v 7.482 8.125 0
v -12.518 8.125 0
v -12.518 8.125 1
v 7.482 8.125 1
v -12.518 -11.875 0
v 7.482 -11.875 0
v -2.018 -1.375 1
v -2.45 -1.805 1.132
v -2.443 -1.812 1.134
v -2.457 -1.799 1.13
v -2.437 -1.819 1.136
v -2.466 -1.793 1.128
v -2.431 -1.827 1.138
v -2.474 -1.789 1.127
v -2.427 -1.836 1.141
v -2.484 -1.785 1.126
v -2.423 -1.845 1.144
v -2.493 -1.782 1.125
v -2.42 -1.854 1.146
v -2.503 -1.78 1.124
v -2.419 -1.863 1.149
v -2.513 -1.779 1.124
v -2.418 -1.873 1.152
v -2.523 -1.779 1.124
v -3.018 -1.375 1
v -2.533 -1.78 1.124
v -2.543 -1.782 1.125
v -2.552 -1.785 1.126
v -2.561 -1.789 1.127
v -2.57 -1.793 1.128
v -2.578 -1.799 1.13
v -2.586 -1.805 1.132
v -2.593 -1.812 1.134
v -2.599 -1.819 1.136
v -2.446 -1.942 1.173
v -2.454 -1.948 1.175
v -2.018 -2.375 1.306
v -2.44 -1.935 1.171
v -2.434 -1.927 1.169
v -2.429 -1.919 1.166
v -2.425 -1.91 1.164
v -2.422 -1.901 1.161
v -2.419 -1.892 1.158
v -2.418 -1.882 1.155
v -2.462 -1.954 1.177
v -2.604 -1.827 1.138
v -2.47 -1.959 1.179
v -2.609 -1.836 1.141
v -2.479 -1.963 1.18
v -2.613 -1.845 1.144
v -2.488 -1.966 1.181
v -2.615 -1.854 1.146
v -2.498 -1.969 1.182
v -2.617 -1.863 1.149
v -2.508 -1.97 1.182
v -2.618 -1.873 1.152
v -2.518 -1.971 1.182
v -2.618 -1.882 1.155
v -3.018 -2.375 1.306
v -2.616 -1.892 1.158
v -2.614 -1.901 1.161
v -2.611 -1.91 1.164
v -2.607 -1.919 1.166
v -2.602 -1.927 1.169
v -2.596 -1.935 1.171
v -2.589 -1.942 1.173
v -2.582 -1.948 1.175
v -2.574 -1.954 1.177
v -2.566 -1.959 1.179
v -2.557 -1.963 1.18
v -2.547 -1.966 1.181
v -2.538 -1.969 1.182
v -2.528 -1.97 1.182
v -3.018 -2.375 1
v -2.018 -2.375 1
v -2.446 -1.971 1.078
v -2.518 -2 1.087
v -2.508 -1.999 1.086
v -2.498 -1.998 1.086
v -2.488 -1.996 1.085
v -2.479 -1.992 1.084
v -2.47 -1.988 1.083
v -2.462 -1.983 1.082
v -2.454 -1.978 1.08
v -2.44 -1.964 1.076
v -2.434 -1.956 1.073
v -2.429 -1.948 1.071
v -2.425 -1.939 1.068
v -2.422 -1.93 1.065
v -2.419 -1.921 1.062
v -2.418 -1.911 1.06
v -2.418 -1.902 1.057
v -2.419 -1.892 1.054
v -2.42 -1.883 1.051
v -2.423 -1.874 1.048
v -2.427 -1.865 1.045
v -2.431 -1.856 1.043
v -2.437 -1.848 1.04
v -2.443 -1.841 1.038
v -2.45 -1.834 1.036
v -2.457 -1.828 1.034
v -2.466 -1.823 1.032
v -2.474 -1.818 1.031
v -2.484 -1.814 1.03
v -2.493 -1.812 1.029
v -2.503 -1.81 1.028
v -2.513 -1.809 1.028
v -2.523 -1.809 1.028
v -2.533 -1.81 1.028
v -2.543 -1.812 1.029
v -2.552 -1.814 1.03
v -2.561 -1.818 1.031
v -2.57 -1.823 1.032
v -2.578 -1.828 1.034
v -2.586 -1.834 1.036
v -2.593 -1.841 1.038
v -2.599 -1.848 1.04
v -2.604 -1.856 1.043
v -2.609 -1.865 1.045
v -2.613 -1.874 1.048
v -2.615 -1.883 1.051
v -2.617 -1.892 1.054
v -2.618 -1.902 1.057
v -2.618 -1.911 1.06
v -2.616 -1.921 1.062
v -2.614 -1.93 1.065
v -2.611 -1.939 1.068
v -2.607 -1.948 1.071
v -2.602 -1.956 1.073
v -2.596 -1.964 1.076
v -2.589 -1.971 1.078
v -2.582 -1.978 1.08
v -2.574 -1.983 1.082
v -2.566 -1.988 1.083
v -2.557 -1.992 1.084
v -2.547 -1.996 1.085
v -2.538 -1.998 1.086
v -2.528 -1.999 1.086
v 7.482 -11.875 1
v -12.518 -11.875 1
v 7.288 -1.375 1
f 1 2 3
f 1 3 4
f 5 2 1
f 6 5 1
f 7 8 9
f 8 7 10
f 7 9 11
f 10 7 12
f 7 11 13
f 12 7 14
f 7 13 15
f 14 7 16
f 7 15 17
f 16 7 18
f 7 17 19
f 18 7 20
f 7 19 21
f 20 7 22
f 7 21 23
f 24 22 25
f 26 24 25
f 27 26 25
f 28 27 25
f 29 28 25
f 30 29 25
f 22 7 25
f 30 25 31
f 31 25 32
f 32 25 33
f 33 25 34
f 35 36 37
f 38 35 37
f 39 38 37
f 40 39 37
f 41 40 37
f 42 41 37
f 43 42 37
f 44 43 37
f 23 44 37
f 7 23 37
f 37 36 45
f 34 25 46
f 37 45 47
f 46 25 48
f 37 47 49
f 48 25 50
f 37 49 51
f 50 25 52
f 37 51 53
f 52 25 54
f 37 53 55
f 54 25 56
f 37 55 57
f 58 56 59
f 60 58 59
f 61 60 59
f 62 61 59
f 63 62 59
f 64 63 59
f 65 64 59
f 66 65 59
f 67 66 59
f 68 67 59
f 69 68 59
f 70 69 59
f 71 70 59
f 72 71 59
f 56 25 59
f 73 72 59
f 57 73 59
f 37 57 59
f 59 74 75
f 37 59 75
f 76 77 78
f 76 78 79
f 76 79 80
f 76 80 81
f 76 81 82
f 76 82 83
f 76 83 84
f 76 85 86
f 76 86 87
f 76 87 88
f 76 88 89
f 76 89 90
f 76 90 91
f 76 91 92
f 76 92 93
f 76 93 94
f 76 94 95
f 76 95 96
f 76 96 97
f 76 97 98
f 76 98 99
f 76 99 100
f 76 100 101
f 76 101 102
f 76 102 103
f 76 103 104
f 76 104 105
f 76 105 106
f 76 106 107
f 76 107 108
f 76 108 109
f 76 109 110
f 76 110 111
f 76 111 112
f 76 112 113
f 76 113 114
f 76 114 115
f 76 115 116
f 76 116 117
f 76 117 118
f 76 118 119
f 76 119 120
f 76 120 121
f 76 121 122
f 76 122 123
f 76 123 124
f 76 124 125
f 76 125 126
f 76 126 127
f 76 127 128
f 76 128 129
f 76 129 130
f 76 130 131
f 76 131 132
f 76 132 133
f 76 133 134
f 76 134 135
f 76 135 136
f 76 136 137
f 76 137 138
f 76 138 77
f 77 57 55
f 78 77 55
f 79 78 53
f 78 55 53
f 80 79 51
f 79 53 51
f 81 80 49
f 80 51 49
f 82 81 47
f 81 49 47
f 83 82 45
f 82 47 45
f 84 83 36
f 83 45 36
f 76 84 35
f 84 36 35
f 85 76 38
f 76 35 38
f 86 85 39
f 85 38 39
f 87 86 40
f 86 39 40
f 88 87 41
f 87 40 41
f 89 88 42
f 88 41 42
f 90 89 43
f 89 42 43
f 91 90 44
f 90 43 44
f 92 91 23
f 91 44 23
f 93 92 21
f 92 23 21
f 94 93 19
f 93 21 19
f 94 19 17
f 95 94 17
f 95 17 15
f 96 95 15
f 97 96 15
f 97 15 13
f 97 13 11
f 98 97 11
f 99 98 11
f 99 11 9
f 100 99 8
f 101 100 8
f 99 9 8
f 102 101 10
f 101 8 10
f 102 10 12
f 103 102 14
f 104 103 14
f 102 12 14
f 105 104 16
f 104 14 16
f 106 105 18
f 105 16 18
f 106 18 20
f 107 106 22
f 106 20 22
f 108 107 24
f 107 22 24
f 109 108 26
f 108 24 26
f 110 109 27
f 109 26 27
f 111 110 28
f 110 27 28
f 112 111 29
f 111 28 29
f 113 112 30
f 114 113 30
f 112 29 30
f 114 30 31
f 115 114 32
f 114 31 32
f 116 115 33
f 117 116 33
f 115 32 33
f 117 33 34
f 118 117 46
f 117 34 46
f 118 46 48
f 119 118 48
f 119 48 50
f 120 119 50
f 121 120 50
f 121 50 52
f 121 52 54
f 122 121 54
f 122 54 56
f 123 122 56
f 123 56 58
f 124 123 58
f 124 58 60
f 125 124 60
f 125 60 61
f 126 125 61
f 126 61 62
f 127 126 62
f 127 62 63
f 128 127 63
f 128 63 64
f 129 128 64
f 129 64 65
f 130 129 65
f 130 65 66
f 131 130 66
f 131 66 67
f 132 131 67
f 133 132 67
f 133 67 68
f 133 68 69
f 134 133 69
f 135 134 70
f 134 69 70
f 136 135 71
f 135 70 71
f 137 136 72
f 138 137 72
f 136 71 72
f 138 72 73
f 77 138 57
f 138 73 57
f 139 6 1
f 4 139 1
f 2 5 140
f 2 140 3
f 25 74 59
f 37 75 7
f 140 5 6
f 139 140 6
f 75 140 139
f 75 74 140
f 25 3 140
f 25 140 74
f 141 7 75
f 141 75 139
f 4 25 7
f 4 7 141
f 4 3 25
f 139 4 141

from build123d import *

# Parameters (mm, degrees)
SKIZZE1_W                       = 20
SKIZZE1_H                       = 20
AUFSATZ_LINEAR_AUSTRAGEN1_DEPTH = 1
SKIZZE2_W                       = 1
SKIZZE2_H                       = 1
AUFSATZ_LINEAR_AUSTRAGEN2_DEPTH = 0.306
SCHNITT_LINEAR_AUSTRAGEN1_DEPTH = 10.306
SKIZZE4_R                       = 0.1
SCHNITT_LINEAR_AUSTRAGEN2_DEPTH = 0.1


with BuildPart() as part:
    # Skizze1 → Aufsatz-Linear austragen1 (new body)
    with BuildSketch(Plane.XY):
        with Locations((-2.517837541, -1.875)):
            Rectangle(SKIZZE1_W, SKIZZE1_H)
    extrude(amount=AUFSATZ_LINEAR_AUSTRAGEN1_DEPTH)

    # Skizze2 → Aufsatz-Linear austragen2 (add)
    with BuildSketch(Plane.XY.offset(1)):
        with Locations((-2.517837541, -1.875)):
            Rectangle(SKIZZE2_W, SKIZZE2_H)
    extrude(amount=AUFSATZ_LINEAR_AUSTRAGEN2_DEPTH)

    # Skizze3 → Schnitt-Linear austragen1 (cut)
    with BuildSketch(Plane.ZY.offset(3.017837541)):
        Polygon((1, -1.375), (1.306, -2.375), (1.306, -1.375), align=None)
    extrude(amount=-SCHNITT_LINEAR_AUSTRAGEN1_DEPTH, mode=Mode.SUBTRACT)

    # Skizze4 → Schnitt-Linear austragen2 (cut)
    with BuildSketch(Plane(origin=(0, 0.162074493, 0.529655205), x_dir=(1, 0, 0), z_dir=(1.0151852031872135e-15, 0.2926072129783145, 0.9562327221513931))):
        with Locations(Location((-2.517837541, -2.130312471, 0), (0, 0, 270))):
            Circle(SKIZZE4_R)
    extrude(amount=-SCHNITT_LINEAR_AUSTRAGEN2_DEPTH, mode=Mode.SUBTRACT)


solid = part.part
